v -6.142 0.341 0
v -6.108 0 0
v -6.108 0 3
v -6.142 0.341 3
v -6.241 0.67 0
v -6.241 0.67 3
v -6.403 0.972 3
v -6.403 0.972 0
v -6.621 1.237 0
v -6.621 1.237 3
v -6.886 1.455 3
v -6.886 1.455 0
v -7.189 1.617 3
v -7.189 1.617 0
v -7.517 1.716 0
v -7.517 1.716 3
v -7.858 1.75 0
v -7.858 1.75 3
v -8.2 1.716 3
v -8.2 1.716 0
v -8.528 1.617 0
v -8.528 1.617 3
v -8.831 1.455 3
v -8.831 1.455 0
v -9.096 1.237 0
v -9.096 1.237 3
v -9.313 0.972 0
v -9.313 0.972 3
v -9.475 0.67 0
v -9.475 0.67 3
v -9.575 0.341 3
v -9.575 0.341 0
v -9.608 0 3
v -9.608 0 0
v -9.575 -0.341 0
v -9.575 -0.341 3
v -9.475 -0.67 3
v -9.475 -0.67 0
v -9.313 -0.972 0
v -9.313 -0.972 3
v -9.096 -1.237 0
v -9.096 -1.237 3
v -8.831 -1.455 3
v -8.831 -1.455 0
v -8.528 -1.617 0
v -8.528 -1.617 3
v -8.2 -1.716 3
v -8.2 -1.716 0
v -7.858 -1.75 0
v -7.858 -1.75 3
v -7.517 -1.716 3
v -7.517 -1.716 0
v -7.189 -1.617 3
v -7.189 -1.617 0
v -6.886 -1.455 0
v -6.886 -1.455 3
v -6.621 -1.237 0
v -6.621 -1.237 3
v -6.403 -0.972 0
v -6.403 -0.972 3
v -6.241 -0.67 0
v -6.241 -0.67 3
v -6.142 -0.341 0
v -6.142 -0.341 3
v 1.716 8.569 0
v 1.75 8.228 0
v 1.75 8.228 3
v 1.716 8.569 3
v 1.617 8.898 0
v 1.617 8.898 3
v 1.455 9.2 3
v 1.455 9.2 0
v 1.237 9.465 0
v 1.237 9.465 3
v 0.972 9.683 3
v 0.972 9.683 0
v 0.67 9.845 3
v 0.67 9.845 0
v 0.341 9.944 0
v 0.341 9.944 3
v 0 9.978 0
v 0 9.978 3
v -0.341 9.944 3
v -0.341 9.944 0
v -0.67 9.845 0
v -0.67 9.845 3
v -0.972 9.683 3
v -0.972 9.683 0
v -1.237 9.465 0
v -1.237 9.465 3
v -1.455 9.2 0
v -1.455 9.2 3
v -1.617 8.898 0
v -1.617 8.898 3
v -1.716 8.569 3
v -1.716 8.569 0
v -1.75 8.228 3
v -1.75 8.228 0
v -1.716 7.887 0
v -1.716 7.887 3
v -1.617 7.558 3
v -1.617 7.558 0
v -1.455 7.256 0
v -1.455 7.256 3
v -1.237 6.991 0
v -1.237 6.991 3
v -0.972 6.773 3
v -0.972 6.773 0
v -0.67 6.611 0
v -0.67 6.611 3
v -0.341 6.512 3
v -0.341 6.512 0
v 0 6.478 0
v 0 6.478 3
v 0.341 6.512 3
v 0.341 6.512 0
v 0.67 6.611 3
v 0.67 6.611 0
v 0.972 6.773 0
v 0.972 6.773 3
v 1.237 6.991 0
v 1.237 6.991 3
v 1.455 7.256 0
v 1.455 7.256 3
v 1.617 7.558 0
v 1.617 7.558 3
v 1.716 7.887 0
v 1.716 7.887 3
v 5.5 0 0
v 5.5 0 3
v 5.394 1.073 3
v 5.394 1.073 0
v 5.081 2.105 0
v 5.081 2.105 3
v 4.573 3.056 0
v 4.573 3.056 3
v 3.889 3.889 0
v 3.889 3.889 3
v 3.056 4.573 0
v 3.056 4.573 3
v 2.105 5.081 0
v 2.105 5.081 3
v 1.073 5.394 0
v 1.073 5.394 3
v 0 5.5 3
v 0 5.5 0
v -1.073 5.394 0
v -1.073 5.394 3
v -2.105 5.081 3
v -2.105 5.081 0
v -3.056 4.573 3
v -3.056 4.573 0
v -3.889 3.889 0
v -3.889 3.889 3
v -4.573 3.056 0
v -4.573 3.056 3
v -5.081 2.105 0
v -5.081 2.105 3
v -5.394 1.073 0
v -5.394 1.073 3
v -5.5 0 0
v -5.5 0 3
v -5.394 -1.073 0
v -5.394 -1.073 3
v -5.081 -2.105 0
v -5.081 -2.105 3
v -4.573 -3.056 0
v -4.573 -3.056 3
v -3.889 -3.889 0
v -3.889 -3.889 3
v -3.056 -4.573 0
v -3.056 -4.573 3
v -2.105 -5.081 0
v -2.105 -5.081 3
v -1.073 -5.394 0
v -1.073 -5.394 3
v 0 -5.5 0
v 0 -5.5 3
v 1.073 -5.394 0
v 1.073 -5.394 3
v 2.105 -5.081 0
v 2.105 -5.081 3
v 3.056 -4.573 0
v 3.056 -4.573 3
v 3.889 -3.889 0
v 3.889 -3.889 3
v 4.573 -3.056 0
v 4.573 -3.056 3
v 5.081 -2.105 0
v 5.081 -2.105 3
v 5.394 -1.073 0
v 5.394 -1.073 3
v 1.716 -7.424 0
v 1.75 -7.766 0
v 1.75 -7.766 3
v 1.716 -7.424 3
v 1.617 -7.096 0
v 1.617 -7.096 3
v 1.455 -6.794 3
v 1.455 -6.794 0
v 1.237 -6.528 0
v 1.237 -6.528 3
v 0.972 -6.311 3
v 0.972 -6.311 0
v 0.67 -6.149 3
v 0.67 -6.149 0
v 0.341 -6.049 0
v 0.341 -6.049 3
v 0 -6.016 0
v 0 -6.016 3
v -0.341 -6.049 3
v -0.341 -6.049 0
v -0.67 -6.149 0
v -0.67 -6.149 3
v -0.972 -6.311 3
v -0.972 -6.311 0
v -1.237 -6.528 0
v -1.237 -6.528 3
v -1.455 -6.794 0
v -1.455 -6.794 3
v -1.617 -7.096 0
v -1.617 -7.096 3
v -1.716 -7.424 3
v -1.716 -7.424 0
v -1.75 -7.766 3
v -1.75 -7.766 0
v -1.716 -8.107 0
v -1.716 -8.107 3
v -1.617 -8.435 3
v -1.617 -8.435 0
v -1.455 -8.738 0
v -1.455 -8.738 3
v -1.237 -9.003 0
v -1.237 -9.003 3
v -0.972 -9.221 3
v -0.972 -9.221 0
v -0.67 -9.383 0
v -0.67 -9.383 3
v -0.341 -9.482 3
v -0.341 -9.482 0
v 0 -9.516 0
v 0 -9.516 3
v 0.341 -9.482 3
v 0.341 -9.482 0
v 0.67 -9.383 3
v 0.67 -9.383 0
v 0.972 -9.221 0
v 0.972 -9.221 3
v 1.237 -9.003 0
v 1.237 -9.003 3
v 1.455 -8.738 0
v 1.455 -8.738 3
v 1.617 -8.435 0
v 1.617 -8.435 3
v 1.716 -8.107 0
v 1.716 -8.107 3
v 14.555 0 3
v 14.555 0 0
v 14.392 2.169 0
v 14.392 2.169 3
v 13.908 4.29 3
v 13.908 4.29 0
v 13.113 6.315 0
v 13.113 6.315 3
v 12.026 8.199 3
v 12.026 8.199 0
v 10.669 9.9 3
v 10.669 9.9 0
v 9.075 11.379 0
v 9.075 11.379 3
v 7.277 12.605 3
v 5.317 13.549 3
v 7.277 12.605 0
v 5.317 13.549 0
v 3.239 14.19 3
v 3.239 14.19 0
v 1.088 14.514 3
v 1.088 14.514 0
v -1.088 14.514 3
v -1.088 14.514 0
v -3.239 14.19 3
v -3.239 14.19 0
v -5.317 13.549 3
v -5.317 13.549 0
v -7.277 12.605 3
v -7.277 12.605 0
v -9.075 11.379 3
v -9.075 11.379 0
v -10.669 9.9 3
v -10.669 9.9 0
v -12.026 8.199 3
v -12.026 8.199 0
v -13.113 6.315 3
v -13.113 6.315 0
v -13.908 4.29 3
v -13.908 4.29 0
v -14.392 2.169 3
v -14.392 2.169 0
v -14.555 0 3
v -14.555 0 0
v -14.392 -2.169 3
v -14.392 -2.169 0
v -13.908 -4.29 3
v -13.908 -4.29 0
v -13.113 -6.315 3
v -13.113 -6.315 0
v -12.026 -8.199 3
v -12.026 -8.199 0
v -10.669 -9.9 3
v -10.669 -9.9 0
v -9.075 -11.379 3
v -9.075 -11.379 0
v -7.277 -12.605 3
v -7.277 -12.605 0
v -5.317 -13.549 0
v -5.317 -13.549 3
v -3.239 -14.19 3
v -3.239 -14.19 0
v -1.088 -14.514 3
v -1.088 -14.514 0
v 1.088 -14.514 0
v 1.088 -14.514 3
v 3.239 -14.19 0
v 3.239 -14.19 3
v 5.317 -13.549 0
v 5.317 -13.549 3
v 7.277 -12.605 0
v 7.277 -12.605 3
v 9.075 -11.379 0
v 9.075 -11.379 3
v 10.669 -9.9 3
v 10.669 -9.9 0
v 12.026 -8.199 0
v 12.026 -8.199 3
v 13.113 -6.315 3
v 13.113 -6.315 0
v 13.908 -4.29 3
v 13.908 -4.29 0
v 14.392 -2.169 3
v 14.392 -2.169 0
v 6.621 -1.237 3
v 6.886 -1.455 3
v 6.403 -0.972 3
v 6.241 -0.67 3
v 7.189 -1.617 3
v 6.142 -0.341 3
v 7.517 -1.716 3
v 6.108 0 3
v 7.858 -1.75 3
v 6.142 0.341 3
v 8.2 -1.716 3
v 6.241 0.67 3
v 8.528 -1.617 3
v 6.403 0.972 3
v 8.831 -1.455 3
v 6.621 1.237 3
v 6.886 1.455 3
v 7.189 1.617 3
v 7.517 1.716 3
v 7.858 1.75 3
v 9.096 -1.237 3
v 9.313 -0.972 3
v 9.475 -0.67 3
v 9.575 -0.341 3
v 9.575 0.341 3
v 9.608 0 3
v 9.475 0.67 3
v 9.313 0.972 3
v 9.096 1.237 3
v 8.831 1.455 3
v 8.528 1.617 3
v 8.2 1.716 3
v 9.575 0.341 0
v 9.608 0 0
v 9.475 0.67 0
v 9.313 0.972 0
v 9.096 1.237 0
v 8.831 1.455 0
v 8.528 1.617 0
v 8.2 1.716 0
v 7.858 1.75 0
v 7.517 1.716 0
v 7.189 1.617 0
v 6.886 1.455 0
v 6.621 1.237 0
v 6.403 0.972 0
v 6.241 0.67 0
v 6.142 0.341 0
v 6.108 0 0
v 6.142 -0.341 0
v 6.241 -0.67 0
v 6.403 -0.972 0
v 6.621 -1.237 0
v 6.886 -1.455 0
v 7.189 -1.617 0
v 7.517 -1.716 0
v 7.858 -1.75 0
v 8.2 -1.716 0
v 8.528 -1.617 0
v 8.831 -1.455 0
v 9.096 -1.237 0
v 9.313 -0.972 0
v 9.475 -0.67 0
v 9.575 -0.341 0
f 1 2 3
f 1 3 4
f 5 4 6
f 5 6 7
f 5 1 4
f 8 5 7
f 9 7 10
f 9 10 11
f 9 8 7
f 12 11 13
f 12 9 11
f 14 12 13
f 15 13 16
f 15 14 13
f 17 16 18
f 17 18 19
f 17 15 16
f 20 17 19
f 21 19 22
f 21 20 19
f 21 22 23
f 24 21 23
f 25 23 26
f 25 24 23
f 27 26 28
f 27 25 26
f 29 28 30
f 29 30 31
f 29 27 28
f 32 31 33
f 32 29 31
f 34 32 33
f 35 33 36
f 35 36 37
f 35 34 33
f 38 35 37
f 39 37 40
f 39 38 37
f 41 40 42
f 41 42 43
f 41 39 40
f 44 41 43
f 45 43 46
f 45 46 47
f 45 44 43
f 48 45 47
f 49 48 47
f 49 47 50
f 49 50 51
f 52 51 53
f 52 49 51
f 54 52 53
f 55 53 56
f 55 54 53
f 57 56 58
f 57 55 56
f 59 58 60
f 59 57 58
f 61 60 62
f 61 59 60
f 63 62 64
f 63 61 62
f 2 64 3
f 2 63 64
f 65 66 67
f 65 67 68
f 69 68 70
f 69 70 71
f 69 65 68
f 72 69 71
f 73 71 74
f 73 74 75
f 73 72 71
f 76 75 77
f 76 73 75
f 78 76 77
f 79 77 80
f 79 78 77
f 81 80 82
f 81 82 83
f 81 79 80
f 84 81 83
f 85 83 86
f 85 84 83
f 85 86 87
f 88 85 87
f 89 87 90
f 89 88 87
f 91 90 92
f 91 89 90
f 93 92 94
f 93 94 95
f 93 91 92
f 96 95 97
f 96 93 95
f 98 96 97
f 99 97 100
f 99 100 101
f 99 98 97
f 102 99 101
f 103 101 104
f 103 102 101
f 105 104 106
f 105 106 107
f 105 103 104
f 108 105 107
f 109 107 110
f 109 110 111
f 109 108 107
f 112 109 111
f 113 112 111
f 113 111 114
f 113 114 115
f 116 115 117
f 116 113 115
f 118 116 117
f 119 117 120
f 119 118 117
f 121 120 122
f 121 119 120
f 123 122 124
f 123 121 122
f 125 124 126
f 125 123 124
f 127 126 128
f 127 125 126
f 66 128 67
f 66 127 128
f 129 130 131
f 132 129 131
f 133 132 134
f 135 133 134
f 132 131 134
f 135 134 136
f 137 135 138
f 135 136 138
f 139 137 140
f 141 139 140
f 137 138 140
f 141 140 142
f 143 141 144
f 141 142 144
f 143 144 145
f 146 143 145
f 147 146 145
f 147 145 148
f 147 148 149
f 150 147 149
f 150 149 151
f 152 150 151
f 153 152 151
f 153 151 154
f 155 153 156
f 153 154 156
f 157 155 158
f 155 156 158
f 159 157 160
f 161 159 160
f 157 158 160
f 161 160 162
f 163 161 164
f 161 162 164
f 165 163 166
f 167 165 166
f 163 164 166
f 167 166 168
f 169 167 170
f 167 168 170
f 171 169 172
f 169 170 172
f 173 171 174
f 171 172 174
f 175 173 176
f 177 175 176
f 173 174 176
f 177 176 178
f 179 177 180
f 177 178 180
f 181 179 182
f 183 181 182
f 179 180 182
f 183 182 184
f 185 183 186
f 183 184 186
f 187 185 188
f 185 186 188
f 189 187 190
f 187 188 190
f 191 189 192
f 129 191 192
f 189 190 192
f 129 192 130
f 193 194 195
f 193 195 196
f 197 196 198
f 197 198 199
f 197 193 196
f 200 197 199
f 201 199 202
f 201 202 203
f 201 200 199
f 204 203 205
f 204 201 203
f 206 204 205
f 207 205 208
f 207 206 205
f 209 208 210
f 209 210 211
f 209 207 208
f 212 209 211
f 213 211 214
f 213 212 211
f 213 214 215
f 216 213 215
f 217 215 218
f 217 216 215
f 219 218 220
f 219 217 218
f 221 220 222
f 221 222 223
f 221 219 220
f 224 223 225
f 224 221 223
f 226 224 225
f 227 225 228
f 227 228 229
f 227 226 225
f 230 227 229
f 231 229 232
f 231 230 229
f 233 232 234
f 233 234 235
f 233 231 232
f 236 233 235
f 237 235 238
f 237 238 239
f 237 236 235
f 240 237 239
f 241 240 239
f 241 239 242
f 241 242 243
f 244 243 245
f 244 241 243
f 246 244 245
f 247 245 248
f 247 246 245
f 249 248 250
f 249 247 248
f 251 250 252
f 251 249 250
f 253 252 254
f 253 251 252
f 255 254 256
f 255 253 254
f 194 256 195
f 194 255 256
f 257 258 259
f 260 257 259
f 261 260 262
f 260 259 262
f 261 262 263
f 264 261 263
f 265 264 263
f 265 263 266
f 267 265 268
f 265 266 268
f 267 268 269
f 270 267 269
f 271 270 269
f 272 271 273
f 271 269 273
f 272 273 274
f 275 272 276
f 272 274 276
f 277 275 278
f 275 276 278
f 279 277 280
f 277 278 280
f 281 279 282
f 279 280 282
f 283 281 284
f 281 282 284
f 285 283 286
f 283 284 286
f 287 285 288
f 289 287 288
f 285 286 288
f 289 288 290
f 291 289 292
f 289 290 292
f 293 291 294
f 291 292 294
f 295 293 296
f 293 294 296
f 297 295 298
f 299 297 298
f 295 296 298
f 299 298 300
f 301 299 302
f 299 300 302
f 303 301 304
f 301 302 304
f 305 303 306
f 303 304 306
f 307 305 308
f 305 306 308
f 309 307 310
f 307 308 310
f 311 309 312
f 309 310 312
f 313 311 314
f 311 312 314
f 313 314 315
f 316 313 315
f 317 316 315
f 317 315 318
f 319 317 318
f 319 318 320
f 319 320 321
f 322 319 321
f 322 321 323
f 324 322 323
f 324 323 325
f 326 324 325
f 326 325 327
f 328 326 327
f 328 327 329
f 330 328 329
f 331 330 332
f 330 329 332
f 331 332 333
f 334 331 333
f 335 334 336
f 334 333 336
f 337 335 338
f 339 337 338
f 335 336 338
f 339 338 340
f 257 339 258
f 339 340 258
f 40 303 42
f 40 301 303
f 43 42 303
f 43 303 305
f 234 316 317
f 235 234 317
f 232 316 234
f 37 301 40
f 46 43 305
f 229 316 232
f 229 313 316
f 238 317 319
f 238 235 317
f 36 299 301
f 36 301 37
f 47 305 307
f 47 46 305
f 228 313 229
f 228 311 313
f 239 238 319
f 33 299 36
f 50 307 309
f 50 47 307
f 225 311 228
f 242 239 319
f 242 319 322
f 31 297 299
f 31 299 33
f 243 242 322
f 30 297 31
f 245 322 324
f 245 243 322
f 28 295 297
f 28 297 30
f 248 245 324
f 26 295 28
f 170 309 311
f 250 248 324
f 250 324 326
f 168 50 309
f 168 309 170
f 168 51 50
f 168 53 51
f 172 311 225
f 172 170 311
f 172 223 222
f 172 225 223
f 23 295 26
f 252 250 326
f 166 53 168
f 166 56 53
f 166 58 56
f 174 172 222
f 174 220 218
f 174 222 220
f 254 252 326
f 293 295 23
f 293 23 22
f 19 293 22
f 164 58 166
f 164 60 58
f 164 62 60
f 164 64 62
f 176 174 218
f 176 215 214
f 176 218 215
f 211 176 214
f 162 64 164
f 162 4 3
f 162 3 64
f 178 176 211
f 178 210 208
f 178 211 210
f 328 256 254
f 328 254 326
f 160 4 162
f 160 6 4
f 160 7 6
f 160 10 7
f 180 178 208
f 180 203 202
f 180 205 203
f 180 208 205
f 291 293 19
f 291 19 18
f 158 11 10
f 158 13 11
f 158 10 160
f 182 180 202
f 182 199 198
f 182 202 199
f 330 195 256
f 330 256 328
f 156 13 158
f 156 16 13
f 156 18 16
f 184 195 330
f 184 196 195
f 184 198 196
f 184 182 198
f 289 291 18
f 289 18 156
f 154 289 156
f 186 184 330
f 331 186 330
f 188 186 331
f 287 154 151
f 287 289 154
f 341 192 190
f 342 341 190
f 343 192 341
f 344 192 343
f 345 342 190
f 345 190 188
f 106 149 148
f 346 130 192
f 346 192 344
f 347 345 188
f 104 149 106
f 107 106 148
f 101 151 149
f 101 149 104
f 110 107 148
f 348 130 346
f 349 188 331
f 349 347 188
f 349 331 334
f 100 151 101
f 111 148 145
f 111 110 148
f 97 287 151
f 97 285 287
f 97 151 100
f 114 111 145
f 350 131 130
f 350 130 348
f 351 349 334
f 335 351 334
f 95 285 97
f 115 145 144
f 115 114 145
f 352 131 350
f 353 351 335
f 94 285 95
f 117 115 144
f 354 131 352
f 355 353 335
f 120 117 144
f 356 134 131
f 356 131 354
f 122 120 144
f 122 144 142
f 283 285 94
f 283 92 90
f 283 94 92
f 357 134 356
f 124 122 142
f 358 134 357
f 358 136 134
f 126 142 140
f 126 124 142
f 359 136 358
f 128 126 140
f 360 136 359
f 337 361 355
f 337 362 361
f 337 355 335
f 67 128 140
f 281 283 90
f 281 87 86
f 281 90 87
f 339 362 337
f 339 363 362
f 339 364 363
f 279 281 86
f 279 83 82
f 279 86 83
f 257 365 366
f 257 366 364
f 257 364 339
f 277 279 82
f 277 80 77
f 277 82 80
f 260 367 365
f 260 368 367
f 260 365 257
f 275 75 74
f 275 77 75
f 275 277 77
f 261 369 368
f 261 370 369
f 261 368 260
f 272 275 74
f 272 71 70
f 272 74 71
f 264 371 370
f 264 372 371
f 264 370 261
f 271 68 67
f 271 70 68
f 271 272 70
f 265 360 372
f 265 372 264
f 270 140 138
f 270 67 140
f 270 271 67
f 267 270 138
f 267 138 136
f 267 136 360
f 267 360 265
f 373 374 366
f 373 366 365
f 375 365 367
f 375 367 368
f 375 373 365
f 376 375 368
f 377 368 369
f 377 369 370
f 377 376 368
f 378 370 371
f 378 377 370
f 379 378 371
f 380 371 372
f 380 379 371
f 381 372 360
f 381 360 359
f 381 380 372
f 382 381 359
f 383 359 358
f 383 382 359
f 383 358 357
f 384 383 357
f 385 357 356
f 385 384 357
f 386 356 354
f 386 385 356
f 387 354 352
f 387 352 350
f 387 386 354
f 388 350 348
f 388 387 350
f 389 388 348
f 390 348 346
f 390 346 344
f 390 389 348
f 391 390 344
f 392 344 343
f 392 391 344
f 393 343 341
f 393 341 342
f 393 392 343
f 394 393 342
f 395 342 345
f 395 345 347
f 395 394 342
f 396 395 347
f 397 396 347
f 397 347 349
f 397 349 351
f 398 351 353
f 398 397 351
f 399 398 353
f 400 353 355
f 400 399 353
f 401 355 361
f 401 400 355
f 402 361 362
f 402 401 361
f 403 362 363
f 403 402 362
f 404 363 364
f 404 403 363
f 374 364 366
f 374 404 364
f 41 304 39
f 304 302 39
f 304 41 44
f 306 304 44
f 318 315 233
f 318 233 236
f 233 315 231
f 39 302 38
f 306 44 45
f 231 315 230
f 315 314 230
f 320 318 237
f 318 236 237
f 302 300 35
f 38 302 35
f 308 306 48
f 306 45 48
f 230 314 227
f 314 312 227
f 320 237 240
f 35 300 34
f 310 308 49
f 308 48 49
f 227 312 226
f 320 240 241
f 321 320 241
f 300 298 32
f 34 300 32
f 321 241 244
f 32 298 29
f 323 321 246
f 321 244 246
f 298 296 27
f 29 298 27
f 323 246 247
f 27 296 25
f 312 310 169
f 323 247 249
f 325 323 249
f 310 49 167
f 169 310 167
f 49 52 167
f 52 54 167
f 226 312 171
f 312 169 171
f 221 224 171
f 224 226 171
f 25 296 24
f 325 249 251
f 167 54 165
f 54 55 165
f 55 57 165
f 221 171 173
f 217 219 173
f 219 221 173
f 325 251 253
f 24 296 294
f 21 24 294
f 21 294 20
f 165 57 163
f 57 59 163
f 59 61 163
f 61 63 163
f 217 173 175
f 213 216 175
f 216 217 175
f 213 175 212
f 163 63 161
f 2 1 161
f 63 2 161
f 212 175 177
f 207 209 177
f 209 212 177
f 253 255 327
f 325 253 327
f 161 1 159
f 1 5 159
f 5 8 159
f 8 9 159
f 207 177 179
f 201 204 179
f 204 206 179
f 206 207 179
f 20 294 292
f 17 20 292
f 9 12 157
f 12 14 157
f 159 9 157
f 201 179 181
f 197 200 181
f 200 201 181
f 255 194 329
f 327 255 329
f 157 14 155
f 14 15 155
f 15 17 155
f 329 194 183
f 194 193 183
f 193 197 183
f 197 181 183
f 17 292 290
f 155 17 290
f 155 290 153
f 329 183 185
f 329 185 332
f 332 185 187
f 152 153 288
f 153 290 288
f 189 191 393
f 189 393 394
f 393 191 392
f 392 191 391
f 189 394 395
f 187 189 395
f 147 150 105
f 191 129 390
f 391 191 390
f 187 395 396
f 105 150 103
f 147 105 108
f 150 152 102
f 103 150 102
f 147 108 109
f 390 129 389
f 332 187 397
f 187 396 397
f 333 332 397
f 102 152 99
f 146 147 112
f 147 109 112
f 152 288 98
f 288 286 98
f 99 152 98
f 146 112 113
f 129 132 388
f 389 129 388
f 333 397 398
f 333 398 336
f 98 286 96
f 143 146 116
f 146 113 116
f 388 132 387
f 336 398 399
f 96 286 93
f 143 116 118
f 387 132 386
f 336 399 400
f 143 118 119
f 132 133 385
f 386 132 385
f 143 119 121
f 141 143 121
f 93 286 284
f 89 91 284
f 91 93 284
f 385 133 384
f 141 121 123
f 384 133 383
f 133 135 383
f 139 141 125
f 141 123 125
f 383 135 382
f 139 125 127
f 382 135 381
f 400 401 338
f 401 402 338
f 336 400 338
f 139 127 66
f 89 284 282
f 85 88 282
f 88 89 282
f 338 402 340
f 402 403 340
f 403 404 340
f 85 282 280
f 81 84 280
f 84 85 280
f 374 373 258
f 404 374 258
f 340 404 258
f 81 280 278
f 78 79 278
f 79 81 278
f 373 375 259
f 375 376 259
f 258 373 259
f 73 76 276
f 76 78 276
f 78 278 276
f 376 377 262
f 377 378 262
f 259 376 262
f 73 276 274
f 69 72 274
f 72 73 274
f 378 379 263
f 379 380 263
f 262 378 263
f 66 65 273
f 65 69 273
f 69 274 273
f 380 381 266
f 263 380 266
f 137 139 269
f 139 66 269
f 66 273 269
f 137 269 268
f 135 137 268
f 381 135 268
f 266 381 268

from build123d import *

# Parameters (mm, degrees)
SKETCH1_R           = 14.554642106
SKETCH1_R_2         = 1.75
BOSS_EXTRUDE1_DEPTH = 3
SKETCH2_R           = 5.5
CUT_EXTRUDE1_DEPTH  = 3


with BuildPart() as part:
    # Sketch1 → Boss-Extrude1 (new body)
    with BuildSketch(Plane.XY):
        Circle(SKETCH1_R)
        with Locations((0, 8.228052911)):
            Circle(SKETCH1_R_2, mode=Mode.SUBTRACT)
        with Locations((-7.85825278, 0)):
            Circle(SKETCH1_R_2, mode=Mode.SUBTRACT)
        with Locations((0, -7.765802747)):
            Circle(SKETCH1_R_2, mode=Mode.SUBTRACT)
        with Locations((7.85825278, 0)):
            Circle(SKETCH1_R_2, mode=Mode.SUBTRACT)
    extrude(amount=BOSS_EXTRUDE1_DEPTH)

    # Sketch2 → Cut-Extrude1 (cut)
    with BuildSketch(Plane.XY.offset(3)):
        Circle(SKETCH2_R)
    extrude(amount=-CUT_EXTRUDE1_DEPTH, mode=Mode.SUBTRACT)


solid = part.part
